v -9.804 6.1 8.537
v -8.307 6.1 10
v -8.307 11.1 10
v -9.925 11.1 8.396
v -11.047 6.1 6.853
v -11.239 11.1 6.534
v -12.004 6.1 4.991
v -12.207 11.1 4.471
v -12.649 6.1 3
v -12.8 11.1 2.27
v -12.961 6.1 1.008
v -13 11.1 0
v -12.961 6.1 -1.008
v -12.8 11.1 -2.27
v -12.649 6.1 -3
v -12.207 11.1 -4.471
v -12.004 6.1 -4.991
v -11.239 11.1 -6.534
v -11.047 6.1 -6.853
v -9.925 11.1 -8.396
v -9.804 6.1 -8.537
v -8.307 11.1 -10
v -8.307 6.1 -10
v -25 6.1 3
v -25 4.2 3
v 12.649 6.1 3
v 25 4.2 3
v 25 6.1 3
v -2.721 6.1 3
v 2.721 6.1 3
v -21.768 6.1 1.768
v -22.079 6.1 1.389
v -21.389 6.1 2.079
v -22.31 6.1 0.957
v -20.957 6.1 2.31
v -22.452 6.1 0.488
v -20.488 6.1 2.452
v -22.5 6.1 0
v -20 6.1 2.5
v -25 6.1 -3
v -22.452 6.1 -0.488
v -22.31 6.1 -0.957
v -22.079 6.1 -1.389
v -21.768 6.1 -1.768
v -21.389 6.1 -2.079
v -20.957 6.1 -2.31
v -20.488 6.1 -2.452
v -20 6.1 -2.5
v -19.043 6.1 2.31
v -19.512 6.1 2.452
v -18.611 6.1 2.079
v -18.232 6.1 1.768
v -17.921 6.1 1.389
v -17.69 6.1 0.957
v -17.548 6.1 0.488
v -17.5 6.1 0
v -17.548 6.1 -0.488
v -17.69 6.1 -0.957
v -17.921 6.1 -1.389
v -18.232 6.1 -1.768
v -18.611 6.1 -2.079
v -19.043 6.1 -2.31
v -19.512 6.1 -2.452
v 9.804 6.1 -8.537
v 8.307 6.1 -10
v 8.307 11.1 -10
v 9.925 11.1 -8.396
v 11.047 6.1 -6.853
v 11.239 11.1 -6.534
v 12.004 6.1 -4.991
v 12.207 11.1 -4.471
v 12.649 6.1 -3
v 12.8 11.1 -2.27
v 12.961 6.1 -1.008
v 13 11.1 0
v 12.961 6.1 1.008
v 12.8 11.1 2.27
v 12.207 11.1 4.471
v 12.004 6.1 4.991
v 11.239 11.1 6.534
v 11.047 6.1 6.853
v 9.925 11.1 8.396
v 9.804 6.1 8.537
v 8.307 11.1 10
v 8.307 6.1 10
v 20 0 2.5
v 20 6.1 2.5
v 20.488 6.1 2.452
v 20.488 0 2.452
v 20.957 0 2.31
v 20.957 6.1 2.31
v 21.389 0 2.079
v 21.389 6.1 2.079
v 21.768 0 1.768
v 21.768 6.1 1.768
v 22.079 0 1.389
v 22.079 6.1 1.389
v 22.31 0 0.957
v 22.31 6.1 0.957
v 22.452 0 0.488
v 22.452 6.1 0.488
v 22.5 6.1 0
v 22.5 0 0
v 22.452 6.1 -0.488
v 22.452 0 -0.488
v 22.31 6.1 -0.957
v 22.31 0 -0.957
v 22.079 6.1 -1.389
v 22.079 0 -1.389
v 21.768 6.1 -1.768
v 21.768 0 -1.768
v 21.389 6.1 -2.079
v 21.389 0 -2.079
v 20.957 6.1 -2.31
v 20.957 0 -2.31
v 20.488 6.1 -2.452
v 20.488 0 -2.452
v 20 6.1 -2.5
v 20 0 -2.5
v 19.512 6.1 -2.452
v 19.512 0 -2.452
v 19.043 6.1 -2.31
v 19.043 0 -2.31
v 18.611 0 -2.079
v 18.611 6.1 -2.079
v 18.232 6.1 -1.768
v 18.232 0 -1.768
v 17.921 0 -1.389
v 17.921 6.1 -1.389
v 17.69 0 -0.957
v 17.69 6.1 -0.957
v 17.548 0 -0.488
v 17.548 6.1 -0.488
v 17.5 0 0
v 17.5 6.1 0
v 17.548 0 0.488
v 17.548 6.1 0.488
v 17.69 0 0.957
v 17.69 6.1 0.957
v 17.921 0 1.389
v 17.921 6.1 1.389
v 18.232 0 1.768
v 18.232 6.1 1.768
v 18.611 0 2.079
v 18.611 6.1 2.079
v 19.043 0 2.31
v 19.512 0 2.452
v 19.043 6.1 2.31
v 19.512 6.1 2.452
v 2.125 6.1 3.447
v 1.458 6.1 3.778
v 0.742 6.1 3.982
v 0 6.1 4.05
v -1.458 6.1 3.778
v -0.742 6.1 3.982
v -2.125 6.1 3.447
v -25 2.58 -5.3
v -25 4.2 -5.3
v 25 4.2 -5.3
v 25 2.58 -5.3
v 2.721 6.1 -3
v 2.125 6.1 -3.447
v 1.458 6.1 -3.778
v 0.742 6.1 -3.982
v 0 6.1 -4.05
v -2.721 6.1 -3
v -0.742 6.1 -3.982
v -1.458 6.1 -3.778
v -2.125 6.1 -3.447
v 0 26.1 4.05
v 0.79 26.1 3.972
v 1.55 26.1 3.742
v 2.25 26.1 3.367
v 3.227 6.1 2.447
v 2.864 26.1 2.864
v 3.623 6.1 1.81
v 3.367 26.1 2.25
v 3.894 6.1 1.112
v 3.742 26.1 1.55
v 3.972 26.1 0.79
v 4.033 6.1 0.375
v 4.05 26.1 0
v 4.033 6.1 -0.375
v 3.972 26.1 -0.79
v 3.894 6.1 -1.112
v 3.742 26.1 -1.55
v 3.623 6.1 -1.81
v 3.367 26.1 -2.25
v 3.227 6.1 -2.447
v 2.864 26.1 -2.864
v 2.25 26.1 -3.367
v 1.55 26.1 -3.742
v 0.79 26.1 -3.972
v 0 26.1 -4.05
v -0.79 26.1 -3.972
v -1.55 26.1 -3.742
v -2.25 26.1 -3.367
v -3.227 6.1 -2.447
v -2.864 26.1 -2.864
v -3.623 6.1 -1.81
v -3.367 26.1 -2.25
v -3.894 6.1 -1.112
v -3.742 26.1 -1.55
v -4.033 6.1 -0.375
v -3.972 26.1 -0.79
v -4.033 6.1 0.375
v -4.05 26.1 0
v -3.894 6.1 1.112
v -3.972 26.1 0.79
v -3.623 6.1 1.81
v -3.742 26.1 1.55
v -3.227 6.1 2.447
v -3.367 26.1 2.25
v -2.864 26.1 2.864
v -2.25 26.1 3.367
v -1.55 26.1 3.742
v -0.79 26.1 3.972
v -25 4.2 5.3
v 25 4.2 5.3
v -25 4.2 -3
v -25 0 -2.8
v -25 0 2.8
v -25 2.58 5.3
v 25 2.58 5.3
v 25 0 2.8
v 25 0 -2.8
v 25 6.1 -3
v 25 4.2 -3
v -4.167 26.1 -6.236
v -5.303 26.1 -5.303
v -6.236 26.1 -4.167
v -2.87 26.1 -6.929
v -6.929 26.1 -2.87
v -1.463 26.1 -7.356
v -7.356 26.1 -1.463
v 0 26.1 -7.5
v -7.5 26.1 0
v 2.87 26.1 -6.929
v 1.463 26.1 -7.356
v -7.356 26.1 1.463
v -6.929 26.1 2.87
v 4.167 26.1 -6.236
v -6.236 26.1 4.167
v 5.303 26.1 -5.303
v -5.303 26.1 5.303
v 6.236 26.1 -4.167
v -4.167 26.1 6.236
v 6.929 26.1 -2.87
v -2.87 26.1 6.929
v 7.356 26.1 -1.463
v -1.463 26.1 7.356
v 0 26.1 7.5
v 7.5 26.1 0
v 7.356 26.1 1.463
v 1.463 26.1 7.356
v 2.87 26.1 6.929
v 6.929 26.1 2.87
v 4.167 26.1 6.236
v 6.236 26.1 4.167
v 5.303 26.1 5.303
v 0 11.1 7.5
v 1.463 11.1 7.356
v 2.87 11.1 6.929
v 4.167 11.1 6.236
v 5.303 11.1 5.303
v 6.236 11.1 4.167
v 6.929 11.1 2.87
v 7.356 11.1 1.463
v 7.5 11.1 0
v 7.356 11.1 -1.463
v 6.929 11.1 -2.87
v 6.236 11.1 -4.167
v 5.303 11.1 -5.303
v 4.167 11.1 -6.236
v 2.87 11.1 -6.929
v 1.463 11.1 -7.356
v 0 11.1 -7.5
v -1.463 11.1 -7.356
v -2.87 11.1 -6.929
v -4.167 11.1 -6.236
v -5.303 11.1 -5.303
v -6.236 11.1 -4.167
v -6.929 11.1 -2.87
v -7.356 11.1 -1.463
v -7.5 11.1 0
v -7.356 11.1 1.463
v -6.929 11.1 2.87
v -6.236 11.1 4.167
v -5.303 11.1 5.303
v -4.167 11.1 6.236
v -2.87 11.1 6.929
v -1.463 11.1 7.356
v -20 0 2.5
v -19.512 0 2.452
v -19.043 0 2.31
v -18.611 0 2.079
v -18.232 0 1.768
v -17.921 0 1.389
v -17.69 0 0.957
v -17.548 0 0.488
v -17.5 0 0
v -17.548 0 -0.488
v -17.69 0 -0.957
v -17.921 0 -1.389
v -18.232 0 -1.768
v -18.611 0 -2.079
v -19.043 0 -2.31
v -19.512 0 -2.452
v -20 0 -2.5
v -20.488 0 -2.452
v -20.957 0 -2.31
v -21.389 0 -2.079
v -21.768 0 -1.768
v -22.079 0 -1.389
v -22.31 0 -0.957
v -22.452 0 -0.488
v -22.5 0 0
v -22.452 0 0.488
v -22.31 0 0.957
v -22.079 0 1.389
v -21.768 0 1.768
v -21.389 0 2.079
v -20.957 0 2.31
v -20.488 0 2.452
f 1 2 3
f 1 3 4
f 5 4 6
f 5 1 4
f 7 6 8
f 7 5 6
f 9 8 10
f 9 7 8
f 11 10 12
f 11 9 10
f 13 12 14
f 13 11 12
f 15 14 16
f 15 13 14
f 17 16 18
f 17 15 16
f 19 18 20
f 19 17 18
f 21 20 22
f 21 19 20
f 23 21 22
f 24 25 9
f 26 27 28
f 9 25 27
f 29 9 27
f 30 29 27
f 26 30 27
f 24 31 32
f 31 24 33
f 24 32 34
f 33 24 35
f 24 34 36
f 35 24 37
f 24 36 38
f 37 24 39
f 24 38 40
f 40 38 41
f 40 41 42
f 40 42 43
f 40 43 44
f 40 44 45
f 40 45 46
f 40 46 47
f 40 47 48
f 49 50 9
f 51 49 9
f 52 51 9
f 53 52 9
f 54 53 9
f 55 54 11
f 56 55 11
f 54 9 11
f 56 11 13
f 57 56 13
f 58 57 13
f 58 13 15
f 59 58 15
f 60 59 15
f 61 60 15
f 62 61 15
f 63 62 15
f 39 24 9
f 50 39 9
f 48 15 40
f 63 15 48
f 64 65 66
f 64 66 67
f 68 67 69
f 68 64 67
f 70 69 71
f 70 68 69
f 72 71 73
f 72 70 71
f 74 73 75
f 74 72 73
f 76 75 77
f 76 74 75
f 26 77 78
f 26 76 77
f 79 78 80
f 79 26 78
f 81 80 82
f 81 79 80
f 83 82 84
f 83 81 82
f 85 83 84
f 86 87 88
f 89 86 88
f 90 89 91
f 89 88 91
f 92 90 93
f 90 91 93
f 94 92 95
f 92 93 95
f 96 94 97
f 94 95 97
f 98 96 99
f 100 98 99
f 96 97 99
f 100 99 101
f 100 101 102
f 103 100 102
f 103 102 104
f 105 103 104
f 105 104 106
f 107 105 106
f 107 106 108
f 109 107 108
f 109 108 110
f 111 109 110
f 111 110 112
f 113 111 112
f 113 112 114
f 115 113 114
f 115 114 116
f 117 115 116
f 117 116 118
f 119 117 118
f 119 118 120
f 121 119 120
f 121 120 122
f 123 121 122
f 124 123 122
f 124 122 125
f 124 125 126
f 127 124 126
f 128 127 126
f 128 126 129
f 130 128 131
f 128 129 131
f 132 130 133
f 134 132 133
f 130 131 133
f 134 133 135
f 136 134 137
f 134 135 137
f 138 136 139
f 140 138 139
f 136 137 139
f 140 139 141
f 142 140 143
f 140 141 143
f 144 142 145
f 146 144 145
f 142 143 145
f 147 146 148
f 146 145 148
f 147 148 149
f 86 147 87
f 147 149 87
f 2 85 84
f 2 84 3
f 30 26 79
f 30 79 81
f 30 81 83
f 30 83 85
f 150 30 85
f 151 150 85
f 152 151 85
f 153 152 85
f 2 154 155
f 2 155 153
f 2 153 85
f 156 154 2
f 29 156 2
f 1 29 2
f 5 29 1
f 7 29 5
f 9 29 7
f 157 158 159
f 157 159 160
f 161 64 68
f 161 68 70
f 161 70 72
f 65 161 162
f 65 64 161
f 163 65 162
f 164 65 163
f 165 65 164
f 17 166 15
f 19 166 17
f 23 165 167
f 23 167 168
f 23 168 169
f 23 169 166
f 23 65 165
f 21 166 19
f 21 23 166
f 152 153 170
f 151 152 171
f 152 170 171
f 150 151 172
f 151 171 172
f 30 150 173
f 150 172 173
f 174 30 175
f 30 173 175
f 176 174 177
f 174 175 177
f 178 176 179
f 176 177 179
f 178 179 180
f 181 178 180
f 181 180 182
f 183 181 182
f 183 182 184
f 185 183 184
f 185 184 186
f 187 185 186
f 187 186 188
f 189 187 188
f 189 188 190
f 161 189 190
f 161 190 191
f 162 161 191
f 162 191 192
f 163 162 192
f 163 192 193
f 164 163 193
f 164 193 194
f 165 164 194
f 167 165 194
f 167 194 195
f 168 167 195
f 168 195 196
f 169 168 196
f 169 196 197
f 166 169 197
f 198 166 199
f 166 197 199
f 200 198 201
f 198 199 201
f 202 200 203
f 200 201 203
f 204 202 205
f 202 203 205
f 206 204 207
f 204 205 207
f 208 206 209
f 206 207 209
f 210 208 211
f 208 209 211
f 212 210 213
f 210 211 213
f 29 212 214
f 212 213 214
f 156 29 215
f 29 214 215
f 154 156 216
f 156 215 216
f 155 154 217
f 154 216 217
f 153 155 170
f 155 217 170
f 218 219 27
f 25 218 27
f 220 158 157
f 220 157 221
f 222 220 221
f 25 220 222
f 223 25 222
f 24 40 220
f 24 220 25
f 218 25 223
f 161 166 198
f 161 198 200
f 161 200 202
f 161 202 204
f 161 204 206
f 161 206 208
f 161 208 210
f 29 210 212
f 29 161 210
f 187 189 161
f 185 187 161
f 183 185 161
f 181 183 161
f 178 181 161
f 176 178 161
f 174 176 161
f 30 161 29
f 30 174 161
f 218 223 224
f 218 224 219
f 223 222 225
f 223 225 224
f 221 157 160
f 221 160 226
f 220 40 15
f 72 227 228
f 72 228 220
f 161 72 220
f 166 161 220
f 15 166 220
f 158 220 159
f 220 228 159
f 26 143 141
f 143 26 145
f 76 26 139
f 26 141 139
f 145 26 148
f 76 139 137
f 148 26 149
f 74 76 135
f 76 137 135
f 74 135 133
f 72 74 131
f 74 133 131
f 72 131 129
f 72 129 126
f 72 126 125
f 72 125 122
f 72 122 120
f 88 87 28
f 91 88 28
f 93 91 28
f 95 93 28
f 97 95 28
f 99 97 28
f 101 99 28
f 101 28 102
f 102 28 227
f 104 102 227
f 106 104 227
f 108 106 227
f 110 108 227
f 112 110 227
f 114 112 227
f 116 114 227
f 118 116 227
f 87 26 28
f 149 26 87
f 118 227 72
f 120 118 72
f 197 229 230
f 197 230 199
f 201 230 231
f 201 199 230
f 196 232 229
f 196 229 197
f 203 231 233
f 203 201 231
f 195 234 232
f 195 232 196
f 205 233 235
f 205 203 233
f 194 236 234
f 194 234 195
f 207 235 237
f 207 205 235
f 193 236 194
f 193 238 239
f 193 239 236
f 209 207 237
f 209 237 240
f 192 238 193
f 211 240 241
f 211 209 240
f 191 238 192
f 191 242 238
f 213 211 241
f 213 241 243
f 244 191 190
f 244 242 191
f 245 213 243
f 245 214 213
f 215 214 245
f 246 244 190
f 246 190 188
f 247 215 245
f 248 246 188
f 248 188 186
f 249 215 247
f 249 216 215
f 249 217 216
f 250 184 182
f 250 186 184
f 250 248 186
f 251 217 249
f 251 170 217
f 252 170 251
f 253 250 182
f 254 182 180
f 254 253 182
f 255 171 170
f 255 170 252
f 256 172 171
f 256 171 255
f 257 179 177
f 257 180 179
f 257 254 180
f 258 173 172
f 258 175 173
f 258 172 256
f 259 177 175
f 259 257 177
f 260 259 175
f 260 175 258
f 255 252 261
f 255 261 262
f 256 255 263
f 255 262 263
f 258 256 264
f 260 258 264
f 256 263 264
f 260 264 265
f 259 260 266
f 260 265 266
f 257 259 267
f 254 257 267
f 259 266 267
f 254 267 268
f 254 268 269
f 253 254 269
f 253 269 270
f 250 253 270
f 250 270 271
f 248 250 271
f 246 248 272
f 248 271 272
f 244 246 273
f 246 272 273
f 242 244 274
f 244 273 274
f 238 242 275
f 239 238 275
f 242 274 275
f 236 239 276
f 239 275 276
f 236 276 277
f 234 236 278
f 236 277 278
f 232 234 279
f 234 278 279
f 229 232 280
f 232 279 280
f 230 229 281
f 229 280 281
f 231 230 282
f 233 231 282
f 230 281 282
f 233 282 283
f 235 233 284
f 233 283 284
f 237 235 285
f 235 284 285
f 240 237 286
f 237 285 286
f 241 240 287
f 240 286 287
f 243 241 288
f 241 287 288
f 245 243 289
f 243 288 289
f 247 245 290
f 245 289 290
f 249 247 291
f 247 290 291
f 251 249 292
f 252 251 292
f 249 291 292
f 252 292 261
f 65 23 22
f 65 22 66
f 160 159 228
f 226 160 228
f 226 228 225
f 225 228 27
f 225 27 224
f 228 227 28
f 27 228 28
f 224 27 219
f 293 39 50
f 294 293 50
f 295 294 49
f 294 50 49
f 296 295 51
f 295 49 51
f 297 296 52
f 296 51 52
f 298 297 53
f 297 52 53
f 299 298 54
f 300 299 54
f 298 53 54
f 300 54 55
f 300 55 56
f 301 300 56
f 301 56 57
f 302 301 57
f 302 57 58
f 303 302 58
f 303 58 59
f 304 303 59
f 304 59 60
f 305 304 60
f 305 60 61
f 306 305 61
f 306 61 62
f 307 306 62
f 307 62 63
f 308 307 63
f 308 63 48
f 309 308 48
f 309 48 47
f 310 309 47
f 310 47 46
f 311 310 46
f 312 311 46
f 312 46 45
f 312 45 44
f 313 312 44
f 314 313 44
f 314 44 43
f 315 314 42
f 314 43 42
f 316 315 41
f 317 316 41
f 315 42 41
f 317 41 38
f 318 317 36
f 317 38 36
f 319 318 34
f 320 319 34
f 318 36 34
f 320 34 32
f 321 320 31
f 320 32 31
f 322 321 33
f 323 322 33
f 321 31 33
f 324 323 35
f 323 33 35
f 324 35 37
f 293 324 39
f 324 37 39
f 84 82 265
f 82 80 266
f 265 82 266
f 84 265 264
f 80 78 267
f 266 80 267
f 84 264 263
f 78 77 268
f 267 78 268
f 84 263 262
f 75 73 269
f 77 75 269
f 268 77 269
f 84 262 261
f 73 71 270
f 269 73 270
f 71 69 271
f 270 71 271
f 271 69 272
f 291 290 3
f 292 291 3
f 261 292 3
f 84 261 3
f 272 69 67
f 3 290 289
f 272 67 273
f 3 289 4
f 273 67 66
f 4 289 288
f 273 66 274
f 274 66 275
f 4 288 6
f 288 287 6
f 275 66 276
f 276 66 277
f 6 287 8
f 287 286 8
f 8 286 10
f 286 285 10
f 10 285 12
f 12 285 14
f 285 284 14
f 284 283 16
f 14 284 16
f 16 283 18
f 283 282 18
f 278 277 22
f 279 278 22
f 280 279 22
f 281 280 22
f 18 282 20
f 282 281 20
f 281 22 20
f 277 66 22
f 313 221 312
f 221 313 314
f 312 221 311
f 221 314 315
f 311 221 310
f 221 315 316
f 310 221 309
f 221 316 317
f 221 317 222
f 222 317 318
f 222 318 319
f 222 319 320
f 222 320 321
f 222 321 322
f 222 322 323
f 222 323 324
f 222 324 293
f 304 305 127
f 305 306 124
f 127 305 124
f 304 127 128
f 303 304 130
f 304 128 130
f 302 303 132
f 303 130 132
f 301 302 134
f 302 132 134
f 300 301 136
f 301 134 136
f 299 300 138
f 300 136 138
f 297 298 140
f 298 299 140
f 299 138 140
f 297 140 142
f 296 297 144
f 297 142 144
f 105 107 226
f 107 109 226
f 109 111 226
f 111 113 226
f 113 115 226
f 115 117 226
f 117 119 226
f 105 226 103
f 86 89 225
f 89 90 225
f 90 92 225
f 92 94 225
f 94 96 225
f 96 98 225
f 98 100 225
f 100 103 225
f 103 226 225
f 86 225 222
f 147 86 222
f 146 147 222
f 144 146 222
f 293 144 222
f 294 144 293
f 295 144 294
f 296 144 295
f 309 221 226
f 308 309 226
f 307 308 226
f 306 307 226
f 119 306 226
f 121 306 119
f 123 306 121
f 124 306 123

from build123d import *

# Parameters (mm, degrees)
BOSS_EXTRUDE1_DEPTH = 25
BOSS_EXTRUDE3_DEPTH = 5
SKETCH6_R           = 7.5
BOSS_EXTRUDE4_DEPTH = 15
SKETCH7_R           = 4.05
CUT_EXTRUDE1_DEPTH  = 20
SKETCH8_R           = 2.5
CUT_EXTRUDE2_DEPTH  = 34.541019662


with BuildPart() as part:
    # Sketch2 → Boss-Extrude1 (new, symmetric)
    with BuildSketch(Plane(origin=(0, 0, 0), x_dir=(0, 0, -1), z_dir=(1, 0, 0))):
        Polygon((-3, 6.1), (3, 6.1), (3, 4.2), (5.3, 4.2), (5.3, 2.58), (2.8, 0), (-2.8, 0), (-5.3, 2.58), (-5.3, 4.2), (-3, 4.2), align=None)
    extrude(amount=BOSS_EXTRUDE1_DEPTH, both=True)

    # Sketch5 → Boss-Extrude3 (add)
    with BuildSketch(Plane(origin=(0, 6.1, 0), x_dir=(1, 0, 0), z_dir=(0, 1, 0))):
        with BuildLine():
            Line((8.306623863, -10), (-8.306623863, -10))
            ThreePointArc((-8.306623863, -10), (-13, 0), (-8.306623863, 10))
            Line((-8.306623863, 10), (8.306623863, 10))
            ThreePointArc((8.306623863, 10), (13, 0), (8.306623863, -10))
        make_face()
    extrude(amount=BOSS_EXTRUDE3_DEPTH)

    # Sketch6 → Boss-Extrude4 (add)
    with BuildSketch(Plane(origin=(0, 11.1, 0), x_dir=(1, 0, 0), z_dir=(0, 1, 0))):
        with Locations(Location((0, 0, 0), (0, 0, 270))):
            Circle(SKETCH6_R)
    extrude(amount=BOSS_EXTRUDE4_DEPTH)

    # Sketch7 → Cut-Extrude1 (cut)
    with BuildSketch(Plane(origin=(0, 26.1, 0), x_dir=(1, 0, 0), z_dir=(0, 1, 0))):
        with Locations(Location((0, 0, 0), (0, 0, 270))):
            Circle(SKETCH7_R)
    extrude(amount=-CUT_EXTRUDE1_DEPTH, mode=Mode.SUBTRACT)

    # Sketch8 → Cut-Extrude2 (cut, through all)
    with BuildSketch(Plane(origin=(0, 6.1, 0), x_dir=(1, 0, 0), z_dir=(0, 1, 0))):
        with Locations(Location((20, 0, 0), (0, 0, 270))):
            Circle(SKETCH8_R)
        with Locations(Location((-20, 0, 0), (0, 0, 270))):
            Circle(SKETCH8_R)
    extrude(amount=-CUT_EXTRUDE2_DEPTH, mode=Mode.SUBTRACT)


solid = part.part
